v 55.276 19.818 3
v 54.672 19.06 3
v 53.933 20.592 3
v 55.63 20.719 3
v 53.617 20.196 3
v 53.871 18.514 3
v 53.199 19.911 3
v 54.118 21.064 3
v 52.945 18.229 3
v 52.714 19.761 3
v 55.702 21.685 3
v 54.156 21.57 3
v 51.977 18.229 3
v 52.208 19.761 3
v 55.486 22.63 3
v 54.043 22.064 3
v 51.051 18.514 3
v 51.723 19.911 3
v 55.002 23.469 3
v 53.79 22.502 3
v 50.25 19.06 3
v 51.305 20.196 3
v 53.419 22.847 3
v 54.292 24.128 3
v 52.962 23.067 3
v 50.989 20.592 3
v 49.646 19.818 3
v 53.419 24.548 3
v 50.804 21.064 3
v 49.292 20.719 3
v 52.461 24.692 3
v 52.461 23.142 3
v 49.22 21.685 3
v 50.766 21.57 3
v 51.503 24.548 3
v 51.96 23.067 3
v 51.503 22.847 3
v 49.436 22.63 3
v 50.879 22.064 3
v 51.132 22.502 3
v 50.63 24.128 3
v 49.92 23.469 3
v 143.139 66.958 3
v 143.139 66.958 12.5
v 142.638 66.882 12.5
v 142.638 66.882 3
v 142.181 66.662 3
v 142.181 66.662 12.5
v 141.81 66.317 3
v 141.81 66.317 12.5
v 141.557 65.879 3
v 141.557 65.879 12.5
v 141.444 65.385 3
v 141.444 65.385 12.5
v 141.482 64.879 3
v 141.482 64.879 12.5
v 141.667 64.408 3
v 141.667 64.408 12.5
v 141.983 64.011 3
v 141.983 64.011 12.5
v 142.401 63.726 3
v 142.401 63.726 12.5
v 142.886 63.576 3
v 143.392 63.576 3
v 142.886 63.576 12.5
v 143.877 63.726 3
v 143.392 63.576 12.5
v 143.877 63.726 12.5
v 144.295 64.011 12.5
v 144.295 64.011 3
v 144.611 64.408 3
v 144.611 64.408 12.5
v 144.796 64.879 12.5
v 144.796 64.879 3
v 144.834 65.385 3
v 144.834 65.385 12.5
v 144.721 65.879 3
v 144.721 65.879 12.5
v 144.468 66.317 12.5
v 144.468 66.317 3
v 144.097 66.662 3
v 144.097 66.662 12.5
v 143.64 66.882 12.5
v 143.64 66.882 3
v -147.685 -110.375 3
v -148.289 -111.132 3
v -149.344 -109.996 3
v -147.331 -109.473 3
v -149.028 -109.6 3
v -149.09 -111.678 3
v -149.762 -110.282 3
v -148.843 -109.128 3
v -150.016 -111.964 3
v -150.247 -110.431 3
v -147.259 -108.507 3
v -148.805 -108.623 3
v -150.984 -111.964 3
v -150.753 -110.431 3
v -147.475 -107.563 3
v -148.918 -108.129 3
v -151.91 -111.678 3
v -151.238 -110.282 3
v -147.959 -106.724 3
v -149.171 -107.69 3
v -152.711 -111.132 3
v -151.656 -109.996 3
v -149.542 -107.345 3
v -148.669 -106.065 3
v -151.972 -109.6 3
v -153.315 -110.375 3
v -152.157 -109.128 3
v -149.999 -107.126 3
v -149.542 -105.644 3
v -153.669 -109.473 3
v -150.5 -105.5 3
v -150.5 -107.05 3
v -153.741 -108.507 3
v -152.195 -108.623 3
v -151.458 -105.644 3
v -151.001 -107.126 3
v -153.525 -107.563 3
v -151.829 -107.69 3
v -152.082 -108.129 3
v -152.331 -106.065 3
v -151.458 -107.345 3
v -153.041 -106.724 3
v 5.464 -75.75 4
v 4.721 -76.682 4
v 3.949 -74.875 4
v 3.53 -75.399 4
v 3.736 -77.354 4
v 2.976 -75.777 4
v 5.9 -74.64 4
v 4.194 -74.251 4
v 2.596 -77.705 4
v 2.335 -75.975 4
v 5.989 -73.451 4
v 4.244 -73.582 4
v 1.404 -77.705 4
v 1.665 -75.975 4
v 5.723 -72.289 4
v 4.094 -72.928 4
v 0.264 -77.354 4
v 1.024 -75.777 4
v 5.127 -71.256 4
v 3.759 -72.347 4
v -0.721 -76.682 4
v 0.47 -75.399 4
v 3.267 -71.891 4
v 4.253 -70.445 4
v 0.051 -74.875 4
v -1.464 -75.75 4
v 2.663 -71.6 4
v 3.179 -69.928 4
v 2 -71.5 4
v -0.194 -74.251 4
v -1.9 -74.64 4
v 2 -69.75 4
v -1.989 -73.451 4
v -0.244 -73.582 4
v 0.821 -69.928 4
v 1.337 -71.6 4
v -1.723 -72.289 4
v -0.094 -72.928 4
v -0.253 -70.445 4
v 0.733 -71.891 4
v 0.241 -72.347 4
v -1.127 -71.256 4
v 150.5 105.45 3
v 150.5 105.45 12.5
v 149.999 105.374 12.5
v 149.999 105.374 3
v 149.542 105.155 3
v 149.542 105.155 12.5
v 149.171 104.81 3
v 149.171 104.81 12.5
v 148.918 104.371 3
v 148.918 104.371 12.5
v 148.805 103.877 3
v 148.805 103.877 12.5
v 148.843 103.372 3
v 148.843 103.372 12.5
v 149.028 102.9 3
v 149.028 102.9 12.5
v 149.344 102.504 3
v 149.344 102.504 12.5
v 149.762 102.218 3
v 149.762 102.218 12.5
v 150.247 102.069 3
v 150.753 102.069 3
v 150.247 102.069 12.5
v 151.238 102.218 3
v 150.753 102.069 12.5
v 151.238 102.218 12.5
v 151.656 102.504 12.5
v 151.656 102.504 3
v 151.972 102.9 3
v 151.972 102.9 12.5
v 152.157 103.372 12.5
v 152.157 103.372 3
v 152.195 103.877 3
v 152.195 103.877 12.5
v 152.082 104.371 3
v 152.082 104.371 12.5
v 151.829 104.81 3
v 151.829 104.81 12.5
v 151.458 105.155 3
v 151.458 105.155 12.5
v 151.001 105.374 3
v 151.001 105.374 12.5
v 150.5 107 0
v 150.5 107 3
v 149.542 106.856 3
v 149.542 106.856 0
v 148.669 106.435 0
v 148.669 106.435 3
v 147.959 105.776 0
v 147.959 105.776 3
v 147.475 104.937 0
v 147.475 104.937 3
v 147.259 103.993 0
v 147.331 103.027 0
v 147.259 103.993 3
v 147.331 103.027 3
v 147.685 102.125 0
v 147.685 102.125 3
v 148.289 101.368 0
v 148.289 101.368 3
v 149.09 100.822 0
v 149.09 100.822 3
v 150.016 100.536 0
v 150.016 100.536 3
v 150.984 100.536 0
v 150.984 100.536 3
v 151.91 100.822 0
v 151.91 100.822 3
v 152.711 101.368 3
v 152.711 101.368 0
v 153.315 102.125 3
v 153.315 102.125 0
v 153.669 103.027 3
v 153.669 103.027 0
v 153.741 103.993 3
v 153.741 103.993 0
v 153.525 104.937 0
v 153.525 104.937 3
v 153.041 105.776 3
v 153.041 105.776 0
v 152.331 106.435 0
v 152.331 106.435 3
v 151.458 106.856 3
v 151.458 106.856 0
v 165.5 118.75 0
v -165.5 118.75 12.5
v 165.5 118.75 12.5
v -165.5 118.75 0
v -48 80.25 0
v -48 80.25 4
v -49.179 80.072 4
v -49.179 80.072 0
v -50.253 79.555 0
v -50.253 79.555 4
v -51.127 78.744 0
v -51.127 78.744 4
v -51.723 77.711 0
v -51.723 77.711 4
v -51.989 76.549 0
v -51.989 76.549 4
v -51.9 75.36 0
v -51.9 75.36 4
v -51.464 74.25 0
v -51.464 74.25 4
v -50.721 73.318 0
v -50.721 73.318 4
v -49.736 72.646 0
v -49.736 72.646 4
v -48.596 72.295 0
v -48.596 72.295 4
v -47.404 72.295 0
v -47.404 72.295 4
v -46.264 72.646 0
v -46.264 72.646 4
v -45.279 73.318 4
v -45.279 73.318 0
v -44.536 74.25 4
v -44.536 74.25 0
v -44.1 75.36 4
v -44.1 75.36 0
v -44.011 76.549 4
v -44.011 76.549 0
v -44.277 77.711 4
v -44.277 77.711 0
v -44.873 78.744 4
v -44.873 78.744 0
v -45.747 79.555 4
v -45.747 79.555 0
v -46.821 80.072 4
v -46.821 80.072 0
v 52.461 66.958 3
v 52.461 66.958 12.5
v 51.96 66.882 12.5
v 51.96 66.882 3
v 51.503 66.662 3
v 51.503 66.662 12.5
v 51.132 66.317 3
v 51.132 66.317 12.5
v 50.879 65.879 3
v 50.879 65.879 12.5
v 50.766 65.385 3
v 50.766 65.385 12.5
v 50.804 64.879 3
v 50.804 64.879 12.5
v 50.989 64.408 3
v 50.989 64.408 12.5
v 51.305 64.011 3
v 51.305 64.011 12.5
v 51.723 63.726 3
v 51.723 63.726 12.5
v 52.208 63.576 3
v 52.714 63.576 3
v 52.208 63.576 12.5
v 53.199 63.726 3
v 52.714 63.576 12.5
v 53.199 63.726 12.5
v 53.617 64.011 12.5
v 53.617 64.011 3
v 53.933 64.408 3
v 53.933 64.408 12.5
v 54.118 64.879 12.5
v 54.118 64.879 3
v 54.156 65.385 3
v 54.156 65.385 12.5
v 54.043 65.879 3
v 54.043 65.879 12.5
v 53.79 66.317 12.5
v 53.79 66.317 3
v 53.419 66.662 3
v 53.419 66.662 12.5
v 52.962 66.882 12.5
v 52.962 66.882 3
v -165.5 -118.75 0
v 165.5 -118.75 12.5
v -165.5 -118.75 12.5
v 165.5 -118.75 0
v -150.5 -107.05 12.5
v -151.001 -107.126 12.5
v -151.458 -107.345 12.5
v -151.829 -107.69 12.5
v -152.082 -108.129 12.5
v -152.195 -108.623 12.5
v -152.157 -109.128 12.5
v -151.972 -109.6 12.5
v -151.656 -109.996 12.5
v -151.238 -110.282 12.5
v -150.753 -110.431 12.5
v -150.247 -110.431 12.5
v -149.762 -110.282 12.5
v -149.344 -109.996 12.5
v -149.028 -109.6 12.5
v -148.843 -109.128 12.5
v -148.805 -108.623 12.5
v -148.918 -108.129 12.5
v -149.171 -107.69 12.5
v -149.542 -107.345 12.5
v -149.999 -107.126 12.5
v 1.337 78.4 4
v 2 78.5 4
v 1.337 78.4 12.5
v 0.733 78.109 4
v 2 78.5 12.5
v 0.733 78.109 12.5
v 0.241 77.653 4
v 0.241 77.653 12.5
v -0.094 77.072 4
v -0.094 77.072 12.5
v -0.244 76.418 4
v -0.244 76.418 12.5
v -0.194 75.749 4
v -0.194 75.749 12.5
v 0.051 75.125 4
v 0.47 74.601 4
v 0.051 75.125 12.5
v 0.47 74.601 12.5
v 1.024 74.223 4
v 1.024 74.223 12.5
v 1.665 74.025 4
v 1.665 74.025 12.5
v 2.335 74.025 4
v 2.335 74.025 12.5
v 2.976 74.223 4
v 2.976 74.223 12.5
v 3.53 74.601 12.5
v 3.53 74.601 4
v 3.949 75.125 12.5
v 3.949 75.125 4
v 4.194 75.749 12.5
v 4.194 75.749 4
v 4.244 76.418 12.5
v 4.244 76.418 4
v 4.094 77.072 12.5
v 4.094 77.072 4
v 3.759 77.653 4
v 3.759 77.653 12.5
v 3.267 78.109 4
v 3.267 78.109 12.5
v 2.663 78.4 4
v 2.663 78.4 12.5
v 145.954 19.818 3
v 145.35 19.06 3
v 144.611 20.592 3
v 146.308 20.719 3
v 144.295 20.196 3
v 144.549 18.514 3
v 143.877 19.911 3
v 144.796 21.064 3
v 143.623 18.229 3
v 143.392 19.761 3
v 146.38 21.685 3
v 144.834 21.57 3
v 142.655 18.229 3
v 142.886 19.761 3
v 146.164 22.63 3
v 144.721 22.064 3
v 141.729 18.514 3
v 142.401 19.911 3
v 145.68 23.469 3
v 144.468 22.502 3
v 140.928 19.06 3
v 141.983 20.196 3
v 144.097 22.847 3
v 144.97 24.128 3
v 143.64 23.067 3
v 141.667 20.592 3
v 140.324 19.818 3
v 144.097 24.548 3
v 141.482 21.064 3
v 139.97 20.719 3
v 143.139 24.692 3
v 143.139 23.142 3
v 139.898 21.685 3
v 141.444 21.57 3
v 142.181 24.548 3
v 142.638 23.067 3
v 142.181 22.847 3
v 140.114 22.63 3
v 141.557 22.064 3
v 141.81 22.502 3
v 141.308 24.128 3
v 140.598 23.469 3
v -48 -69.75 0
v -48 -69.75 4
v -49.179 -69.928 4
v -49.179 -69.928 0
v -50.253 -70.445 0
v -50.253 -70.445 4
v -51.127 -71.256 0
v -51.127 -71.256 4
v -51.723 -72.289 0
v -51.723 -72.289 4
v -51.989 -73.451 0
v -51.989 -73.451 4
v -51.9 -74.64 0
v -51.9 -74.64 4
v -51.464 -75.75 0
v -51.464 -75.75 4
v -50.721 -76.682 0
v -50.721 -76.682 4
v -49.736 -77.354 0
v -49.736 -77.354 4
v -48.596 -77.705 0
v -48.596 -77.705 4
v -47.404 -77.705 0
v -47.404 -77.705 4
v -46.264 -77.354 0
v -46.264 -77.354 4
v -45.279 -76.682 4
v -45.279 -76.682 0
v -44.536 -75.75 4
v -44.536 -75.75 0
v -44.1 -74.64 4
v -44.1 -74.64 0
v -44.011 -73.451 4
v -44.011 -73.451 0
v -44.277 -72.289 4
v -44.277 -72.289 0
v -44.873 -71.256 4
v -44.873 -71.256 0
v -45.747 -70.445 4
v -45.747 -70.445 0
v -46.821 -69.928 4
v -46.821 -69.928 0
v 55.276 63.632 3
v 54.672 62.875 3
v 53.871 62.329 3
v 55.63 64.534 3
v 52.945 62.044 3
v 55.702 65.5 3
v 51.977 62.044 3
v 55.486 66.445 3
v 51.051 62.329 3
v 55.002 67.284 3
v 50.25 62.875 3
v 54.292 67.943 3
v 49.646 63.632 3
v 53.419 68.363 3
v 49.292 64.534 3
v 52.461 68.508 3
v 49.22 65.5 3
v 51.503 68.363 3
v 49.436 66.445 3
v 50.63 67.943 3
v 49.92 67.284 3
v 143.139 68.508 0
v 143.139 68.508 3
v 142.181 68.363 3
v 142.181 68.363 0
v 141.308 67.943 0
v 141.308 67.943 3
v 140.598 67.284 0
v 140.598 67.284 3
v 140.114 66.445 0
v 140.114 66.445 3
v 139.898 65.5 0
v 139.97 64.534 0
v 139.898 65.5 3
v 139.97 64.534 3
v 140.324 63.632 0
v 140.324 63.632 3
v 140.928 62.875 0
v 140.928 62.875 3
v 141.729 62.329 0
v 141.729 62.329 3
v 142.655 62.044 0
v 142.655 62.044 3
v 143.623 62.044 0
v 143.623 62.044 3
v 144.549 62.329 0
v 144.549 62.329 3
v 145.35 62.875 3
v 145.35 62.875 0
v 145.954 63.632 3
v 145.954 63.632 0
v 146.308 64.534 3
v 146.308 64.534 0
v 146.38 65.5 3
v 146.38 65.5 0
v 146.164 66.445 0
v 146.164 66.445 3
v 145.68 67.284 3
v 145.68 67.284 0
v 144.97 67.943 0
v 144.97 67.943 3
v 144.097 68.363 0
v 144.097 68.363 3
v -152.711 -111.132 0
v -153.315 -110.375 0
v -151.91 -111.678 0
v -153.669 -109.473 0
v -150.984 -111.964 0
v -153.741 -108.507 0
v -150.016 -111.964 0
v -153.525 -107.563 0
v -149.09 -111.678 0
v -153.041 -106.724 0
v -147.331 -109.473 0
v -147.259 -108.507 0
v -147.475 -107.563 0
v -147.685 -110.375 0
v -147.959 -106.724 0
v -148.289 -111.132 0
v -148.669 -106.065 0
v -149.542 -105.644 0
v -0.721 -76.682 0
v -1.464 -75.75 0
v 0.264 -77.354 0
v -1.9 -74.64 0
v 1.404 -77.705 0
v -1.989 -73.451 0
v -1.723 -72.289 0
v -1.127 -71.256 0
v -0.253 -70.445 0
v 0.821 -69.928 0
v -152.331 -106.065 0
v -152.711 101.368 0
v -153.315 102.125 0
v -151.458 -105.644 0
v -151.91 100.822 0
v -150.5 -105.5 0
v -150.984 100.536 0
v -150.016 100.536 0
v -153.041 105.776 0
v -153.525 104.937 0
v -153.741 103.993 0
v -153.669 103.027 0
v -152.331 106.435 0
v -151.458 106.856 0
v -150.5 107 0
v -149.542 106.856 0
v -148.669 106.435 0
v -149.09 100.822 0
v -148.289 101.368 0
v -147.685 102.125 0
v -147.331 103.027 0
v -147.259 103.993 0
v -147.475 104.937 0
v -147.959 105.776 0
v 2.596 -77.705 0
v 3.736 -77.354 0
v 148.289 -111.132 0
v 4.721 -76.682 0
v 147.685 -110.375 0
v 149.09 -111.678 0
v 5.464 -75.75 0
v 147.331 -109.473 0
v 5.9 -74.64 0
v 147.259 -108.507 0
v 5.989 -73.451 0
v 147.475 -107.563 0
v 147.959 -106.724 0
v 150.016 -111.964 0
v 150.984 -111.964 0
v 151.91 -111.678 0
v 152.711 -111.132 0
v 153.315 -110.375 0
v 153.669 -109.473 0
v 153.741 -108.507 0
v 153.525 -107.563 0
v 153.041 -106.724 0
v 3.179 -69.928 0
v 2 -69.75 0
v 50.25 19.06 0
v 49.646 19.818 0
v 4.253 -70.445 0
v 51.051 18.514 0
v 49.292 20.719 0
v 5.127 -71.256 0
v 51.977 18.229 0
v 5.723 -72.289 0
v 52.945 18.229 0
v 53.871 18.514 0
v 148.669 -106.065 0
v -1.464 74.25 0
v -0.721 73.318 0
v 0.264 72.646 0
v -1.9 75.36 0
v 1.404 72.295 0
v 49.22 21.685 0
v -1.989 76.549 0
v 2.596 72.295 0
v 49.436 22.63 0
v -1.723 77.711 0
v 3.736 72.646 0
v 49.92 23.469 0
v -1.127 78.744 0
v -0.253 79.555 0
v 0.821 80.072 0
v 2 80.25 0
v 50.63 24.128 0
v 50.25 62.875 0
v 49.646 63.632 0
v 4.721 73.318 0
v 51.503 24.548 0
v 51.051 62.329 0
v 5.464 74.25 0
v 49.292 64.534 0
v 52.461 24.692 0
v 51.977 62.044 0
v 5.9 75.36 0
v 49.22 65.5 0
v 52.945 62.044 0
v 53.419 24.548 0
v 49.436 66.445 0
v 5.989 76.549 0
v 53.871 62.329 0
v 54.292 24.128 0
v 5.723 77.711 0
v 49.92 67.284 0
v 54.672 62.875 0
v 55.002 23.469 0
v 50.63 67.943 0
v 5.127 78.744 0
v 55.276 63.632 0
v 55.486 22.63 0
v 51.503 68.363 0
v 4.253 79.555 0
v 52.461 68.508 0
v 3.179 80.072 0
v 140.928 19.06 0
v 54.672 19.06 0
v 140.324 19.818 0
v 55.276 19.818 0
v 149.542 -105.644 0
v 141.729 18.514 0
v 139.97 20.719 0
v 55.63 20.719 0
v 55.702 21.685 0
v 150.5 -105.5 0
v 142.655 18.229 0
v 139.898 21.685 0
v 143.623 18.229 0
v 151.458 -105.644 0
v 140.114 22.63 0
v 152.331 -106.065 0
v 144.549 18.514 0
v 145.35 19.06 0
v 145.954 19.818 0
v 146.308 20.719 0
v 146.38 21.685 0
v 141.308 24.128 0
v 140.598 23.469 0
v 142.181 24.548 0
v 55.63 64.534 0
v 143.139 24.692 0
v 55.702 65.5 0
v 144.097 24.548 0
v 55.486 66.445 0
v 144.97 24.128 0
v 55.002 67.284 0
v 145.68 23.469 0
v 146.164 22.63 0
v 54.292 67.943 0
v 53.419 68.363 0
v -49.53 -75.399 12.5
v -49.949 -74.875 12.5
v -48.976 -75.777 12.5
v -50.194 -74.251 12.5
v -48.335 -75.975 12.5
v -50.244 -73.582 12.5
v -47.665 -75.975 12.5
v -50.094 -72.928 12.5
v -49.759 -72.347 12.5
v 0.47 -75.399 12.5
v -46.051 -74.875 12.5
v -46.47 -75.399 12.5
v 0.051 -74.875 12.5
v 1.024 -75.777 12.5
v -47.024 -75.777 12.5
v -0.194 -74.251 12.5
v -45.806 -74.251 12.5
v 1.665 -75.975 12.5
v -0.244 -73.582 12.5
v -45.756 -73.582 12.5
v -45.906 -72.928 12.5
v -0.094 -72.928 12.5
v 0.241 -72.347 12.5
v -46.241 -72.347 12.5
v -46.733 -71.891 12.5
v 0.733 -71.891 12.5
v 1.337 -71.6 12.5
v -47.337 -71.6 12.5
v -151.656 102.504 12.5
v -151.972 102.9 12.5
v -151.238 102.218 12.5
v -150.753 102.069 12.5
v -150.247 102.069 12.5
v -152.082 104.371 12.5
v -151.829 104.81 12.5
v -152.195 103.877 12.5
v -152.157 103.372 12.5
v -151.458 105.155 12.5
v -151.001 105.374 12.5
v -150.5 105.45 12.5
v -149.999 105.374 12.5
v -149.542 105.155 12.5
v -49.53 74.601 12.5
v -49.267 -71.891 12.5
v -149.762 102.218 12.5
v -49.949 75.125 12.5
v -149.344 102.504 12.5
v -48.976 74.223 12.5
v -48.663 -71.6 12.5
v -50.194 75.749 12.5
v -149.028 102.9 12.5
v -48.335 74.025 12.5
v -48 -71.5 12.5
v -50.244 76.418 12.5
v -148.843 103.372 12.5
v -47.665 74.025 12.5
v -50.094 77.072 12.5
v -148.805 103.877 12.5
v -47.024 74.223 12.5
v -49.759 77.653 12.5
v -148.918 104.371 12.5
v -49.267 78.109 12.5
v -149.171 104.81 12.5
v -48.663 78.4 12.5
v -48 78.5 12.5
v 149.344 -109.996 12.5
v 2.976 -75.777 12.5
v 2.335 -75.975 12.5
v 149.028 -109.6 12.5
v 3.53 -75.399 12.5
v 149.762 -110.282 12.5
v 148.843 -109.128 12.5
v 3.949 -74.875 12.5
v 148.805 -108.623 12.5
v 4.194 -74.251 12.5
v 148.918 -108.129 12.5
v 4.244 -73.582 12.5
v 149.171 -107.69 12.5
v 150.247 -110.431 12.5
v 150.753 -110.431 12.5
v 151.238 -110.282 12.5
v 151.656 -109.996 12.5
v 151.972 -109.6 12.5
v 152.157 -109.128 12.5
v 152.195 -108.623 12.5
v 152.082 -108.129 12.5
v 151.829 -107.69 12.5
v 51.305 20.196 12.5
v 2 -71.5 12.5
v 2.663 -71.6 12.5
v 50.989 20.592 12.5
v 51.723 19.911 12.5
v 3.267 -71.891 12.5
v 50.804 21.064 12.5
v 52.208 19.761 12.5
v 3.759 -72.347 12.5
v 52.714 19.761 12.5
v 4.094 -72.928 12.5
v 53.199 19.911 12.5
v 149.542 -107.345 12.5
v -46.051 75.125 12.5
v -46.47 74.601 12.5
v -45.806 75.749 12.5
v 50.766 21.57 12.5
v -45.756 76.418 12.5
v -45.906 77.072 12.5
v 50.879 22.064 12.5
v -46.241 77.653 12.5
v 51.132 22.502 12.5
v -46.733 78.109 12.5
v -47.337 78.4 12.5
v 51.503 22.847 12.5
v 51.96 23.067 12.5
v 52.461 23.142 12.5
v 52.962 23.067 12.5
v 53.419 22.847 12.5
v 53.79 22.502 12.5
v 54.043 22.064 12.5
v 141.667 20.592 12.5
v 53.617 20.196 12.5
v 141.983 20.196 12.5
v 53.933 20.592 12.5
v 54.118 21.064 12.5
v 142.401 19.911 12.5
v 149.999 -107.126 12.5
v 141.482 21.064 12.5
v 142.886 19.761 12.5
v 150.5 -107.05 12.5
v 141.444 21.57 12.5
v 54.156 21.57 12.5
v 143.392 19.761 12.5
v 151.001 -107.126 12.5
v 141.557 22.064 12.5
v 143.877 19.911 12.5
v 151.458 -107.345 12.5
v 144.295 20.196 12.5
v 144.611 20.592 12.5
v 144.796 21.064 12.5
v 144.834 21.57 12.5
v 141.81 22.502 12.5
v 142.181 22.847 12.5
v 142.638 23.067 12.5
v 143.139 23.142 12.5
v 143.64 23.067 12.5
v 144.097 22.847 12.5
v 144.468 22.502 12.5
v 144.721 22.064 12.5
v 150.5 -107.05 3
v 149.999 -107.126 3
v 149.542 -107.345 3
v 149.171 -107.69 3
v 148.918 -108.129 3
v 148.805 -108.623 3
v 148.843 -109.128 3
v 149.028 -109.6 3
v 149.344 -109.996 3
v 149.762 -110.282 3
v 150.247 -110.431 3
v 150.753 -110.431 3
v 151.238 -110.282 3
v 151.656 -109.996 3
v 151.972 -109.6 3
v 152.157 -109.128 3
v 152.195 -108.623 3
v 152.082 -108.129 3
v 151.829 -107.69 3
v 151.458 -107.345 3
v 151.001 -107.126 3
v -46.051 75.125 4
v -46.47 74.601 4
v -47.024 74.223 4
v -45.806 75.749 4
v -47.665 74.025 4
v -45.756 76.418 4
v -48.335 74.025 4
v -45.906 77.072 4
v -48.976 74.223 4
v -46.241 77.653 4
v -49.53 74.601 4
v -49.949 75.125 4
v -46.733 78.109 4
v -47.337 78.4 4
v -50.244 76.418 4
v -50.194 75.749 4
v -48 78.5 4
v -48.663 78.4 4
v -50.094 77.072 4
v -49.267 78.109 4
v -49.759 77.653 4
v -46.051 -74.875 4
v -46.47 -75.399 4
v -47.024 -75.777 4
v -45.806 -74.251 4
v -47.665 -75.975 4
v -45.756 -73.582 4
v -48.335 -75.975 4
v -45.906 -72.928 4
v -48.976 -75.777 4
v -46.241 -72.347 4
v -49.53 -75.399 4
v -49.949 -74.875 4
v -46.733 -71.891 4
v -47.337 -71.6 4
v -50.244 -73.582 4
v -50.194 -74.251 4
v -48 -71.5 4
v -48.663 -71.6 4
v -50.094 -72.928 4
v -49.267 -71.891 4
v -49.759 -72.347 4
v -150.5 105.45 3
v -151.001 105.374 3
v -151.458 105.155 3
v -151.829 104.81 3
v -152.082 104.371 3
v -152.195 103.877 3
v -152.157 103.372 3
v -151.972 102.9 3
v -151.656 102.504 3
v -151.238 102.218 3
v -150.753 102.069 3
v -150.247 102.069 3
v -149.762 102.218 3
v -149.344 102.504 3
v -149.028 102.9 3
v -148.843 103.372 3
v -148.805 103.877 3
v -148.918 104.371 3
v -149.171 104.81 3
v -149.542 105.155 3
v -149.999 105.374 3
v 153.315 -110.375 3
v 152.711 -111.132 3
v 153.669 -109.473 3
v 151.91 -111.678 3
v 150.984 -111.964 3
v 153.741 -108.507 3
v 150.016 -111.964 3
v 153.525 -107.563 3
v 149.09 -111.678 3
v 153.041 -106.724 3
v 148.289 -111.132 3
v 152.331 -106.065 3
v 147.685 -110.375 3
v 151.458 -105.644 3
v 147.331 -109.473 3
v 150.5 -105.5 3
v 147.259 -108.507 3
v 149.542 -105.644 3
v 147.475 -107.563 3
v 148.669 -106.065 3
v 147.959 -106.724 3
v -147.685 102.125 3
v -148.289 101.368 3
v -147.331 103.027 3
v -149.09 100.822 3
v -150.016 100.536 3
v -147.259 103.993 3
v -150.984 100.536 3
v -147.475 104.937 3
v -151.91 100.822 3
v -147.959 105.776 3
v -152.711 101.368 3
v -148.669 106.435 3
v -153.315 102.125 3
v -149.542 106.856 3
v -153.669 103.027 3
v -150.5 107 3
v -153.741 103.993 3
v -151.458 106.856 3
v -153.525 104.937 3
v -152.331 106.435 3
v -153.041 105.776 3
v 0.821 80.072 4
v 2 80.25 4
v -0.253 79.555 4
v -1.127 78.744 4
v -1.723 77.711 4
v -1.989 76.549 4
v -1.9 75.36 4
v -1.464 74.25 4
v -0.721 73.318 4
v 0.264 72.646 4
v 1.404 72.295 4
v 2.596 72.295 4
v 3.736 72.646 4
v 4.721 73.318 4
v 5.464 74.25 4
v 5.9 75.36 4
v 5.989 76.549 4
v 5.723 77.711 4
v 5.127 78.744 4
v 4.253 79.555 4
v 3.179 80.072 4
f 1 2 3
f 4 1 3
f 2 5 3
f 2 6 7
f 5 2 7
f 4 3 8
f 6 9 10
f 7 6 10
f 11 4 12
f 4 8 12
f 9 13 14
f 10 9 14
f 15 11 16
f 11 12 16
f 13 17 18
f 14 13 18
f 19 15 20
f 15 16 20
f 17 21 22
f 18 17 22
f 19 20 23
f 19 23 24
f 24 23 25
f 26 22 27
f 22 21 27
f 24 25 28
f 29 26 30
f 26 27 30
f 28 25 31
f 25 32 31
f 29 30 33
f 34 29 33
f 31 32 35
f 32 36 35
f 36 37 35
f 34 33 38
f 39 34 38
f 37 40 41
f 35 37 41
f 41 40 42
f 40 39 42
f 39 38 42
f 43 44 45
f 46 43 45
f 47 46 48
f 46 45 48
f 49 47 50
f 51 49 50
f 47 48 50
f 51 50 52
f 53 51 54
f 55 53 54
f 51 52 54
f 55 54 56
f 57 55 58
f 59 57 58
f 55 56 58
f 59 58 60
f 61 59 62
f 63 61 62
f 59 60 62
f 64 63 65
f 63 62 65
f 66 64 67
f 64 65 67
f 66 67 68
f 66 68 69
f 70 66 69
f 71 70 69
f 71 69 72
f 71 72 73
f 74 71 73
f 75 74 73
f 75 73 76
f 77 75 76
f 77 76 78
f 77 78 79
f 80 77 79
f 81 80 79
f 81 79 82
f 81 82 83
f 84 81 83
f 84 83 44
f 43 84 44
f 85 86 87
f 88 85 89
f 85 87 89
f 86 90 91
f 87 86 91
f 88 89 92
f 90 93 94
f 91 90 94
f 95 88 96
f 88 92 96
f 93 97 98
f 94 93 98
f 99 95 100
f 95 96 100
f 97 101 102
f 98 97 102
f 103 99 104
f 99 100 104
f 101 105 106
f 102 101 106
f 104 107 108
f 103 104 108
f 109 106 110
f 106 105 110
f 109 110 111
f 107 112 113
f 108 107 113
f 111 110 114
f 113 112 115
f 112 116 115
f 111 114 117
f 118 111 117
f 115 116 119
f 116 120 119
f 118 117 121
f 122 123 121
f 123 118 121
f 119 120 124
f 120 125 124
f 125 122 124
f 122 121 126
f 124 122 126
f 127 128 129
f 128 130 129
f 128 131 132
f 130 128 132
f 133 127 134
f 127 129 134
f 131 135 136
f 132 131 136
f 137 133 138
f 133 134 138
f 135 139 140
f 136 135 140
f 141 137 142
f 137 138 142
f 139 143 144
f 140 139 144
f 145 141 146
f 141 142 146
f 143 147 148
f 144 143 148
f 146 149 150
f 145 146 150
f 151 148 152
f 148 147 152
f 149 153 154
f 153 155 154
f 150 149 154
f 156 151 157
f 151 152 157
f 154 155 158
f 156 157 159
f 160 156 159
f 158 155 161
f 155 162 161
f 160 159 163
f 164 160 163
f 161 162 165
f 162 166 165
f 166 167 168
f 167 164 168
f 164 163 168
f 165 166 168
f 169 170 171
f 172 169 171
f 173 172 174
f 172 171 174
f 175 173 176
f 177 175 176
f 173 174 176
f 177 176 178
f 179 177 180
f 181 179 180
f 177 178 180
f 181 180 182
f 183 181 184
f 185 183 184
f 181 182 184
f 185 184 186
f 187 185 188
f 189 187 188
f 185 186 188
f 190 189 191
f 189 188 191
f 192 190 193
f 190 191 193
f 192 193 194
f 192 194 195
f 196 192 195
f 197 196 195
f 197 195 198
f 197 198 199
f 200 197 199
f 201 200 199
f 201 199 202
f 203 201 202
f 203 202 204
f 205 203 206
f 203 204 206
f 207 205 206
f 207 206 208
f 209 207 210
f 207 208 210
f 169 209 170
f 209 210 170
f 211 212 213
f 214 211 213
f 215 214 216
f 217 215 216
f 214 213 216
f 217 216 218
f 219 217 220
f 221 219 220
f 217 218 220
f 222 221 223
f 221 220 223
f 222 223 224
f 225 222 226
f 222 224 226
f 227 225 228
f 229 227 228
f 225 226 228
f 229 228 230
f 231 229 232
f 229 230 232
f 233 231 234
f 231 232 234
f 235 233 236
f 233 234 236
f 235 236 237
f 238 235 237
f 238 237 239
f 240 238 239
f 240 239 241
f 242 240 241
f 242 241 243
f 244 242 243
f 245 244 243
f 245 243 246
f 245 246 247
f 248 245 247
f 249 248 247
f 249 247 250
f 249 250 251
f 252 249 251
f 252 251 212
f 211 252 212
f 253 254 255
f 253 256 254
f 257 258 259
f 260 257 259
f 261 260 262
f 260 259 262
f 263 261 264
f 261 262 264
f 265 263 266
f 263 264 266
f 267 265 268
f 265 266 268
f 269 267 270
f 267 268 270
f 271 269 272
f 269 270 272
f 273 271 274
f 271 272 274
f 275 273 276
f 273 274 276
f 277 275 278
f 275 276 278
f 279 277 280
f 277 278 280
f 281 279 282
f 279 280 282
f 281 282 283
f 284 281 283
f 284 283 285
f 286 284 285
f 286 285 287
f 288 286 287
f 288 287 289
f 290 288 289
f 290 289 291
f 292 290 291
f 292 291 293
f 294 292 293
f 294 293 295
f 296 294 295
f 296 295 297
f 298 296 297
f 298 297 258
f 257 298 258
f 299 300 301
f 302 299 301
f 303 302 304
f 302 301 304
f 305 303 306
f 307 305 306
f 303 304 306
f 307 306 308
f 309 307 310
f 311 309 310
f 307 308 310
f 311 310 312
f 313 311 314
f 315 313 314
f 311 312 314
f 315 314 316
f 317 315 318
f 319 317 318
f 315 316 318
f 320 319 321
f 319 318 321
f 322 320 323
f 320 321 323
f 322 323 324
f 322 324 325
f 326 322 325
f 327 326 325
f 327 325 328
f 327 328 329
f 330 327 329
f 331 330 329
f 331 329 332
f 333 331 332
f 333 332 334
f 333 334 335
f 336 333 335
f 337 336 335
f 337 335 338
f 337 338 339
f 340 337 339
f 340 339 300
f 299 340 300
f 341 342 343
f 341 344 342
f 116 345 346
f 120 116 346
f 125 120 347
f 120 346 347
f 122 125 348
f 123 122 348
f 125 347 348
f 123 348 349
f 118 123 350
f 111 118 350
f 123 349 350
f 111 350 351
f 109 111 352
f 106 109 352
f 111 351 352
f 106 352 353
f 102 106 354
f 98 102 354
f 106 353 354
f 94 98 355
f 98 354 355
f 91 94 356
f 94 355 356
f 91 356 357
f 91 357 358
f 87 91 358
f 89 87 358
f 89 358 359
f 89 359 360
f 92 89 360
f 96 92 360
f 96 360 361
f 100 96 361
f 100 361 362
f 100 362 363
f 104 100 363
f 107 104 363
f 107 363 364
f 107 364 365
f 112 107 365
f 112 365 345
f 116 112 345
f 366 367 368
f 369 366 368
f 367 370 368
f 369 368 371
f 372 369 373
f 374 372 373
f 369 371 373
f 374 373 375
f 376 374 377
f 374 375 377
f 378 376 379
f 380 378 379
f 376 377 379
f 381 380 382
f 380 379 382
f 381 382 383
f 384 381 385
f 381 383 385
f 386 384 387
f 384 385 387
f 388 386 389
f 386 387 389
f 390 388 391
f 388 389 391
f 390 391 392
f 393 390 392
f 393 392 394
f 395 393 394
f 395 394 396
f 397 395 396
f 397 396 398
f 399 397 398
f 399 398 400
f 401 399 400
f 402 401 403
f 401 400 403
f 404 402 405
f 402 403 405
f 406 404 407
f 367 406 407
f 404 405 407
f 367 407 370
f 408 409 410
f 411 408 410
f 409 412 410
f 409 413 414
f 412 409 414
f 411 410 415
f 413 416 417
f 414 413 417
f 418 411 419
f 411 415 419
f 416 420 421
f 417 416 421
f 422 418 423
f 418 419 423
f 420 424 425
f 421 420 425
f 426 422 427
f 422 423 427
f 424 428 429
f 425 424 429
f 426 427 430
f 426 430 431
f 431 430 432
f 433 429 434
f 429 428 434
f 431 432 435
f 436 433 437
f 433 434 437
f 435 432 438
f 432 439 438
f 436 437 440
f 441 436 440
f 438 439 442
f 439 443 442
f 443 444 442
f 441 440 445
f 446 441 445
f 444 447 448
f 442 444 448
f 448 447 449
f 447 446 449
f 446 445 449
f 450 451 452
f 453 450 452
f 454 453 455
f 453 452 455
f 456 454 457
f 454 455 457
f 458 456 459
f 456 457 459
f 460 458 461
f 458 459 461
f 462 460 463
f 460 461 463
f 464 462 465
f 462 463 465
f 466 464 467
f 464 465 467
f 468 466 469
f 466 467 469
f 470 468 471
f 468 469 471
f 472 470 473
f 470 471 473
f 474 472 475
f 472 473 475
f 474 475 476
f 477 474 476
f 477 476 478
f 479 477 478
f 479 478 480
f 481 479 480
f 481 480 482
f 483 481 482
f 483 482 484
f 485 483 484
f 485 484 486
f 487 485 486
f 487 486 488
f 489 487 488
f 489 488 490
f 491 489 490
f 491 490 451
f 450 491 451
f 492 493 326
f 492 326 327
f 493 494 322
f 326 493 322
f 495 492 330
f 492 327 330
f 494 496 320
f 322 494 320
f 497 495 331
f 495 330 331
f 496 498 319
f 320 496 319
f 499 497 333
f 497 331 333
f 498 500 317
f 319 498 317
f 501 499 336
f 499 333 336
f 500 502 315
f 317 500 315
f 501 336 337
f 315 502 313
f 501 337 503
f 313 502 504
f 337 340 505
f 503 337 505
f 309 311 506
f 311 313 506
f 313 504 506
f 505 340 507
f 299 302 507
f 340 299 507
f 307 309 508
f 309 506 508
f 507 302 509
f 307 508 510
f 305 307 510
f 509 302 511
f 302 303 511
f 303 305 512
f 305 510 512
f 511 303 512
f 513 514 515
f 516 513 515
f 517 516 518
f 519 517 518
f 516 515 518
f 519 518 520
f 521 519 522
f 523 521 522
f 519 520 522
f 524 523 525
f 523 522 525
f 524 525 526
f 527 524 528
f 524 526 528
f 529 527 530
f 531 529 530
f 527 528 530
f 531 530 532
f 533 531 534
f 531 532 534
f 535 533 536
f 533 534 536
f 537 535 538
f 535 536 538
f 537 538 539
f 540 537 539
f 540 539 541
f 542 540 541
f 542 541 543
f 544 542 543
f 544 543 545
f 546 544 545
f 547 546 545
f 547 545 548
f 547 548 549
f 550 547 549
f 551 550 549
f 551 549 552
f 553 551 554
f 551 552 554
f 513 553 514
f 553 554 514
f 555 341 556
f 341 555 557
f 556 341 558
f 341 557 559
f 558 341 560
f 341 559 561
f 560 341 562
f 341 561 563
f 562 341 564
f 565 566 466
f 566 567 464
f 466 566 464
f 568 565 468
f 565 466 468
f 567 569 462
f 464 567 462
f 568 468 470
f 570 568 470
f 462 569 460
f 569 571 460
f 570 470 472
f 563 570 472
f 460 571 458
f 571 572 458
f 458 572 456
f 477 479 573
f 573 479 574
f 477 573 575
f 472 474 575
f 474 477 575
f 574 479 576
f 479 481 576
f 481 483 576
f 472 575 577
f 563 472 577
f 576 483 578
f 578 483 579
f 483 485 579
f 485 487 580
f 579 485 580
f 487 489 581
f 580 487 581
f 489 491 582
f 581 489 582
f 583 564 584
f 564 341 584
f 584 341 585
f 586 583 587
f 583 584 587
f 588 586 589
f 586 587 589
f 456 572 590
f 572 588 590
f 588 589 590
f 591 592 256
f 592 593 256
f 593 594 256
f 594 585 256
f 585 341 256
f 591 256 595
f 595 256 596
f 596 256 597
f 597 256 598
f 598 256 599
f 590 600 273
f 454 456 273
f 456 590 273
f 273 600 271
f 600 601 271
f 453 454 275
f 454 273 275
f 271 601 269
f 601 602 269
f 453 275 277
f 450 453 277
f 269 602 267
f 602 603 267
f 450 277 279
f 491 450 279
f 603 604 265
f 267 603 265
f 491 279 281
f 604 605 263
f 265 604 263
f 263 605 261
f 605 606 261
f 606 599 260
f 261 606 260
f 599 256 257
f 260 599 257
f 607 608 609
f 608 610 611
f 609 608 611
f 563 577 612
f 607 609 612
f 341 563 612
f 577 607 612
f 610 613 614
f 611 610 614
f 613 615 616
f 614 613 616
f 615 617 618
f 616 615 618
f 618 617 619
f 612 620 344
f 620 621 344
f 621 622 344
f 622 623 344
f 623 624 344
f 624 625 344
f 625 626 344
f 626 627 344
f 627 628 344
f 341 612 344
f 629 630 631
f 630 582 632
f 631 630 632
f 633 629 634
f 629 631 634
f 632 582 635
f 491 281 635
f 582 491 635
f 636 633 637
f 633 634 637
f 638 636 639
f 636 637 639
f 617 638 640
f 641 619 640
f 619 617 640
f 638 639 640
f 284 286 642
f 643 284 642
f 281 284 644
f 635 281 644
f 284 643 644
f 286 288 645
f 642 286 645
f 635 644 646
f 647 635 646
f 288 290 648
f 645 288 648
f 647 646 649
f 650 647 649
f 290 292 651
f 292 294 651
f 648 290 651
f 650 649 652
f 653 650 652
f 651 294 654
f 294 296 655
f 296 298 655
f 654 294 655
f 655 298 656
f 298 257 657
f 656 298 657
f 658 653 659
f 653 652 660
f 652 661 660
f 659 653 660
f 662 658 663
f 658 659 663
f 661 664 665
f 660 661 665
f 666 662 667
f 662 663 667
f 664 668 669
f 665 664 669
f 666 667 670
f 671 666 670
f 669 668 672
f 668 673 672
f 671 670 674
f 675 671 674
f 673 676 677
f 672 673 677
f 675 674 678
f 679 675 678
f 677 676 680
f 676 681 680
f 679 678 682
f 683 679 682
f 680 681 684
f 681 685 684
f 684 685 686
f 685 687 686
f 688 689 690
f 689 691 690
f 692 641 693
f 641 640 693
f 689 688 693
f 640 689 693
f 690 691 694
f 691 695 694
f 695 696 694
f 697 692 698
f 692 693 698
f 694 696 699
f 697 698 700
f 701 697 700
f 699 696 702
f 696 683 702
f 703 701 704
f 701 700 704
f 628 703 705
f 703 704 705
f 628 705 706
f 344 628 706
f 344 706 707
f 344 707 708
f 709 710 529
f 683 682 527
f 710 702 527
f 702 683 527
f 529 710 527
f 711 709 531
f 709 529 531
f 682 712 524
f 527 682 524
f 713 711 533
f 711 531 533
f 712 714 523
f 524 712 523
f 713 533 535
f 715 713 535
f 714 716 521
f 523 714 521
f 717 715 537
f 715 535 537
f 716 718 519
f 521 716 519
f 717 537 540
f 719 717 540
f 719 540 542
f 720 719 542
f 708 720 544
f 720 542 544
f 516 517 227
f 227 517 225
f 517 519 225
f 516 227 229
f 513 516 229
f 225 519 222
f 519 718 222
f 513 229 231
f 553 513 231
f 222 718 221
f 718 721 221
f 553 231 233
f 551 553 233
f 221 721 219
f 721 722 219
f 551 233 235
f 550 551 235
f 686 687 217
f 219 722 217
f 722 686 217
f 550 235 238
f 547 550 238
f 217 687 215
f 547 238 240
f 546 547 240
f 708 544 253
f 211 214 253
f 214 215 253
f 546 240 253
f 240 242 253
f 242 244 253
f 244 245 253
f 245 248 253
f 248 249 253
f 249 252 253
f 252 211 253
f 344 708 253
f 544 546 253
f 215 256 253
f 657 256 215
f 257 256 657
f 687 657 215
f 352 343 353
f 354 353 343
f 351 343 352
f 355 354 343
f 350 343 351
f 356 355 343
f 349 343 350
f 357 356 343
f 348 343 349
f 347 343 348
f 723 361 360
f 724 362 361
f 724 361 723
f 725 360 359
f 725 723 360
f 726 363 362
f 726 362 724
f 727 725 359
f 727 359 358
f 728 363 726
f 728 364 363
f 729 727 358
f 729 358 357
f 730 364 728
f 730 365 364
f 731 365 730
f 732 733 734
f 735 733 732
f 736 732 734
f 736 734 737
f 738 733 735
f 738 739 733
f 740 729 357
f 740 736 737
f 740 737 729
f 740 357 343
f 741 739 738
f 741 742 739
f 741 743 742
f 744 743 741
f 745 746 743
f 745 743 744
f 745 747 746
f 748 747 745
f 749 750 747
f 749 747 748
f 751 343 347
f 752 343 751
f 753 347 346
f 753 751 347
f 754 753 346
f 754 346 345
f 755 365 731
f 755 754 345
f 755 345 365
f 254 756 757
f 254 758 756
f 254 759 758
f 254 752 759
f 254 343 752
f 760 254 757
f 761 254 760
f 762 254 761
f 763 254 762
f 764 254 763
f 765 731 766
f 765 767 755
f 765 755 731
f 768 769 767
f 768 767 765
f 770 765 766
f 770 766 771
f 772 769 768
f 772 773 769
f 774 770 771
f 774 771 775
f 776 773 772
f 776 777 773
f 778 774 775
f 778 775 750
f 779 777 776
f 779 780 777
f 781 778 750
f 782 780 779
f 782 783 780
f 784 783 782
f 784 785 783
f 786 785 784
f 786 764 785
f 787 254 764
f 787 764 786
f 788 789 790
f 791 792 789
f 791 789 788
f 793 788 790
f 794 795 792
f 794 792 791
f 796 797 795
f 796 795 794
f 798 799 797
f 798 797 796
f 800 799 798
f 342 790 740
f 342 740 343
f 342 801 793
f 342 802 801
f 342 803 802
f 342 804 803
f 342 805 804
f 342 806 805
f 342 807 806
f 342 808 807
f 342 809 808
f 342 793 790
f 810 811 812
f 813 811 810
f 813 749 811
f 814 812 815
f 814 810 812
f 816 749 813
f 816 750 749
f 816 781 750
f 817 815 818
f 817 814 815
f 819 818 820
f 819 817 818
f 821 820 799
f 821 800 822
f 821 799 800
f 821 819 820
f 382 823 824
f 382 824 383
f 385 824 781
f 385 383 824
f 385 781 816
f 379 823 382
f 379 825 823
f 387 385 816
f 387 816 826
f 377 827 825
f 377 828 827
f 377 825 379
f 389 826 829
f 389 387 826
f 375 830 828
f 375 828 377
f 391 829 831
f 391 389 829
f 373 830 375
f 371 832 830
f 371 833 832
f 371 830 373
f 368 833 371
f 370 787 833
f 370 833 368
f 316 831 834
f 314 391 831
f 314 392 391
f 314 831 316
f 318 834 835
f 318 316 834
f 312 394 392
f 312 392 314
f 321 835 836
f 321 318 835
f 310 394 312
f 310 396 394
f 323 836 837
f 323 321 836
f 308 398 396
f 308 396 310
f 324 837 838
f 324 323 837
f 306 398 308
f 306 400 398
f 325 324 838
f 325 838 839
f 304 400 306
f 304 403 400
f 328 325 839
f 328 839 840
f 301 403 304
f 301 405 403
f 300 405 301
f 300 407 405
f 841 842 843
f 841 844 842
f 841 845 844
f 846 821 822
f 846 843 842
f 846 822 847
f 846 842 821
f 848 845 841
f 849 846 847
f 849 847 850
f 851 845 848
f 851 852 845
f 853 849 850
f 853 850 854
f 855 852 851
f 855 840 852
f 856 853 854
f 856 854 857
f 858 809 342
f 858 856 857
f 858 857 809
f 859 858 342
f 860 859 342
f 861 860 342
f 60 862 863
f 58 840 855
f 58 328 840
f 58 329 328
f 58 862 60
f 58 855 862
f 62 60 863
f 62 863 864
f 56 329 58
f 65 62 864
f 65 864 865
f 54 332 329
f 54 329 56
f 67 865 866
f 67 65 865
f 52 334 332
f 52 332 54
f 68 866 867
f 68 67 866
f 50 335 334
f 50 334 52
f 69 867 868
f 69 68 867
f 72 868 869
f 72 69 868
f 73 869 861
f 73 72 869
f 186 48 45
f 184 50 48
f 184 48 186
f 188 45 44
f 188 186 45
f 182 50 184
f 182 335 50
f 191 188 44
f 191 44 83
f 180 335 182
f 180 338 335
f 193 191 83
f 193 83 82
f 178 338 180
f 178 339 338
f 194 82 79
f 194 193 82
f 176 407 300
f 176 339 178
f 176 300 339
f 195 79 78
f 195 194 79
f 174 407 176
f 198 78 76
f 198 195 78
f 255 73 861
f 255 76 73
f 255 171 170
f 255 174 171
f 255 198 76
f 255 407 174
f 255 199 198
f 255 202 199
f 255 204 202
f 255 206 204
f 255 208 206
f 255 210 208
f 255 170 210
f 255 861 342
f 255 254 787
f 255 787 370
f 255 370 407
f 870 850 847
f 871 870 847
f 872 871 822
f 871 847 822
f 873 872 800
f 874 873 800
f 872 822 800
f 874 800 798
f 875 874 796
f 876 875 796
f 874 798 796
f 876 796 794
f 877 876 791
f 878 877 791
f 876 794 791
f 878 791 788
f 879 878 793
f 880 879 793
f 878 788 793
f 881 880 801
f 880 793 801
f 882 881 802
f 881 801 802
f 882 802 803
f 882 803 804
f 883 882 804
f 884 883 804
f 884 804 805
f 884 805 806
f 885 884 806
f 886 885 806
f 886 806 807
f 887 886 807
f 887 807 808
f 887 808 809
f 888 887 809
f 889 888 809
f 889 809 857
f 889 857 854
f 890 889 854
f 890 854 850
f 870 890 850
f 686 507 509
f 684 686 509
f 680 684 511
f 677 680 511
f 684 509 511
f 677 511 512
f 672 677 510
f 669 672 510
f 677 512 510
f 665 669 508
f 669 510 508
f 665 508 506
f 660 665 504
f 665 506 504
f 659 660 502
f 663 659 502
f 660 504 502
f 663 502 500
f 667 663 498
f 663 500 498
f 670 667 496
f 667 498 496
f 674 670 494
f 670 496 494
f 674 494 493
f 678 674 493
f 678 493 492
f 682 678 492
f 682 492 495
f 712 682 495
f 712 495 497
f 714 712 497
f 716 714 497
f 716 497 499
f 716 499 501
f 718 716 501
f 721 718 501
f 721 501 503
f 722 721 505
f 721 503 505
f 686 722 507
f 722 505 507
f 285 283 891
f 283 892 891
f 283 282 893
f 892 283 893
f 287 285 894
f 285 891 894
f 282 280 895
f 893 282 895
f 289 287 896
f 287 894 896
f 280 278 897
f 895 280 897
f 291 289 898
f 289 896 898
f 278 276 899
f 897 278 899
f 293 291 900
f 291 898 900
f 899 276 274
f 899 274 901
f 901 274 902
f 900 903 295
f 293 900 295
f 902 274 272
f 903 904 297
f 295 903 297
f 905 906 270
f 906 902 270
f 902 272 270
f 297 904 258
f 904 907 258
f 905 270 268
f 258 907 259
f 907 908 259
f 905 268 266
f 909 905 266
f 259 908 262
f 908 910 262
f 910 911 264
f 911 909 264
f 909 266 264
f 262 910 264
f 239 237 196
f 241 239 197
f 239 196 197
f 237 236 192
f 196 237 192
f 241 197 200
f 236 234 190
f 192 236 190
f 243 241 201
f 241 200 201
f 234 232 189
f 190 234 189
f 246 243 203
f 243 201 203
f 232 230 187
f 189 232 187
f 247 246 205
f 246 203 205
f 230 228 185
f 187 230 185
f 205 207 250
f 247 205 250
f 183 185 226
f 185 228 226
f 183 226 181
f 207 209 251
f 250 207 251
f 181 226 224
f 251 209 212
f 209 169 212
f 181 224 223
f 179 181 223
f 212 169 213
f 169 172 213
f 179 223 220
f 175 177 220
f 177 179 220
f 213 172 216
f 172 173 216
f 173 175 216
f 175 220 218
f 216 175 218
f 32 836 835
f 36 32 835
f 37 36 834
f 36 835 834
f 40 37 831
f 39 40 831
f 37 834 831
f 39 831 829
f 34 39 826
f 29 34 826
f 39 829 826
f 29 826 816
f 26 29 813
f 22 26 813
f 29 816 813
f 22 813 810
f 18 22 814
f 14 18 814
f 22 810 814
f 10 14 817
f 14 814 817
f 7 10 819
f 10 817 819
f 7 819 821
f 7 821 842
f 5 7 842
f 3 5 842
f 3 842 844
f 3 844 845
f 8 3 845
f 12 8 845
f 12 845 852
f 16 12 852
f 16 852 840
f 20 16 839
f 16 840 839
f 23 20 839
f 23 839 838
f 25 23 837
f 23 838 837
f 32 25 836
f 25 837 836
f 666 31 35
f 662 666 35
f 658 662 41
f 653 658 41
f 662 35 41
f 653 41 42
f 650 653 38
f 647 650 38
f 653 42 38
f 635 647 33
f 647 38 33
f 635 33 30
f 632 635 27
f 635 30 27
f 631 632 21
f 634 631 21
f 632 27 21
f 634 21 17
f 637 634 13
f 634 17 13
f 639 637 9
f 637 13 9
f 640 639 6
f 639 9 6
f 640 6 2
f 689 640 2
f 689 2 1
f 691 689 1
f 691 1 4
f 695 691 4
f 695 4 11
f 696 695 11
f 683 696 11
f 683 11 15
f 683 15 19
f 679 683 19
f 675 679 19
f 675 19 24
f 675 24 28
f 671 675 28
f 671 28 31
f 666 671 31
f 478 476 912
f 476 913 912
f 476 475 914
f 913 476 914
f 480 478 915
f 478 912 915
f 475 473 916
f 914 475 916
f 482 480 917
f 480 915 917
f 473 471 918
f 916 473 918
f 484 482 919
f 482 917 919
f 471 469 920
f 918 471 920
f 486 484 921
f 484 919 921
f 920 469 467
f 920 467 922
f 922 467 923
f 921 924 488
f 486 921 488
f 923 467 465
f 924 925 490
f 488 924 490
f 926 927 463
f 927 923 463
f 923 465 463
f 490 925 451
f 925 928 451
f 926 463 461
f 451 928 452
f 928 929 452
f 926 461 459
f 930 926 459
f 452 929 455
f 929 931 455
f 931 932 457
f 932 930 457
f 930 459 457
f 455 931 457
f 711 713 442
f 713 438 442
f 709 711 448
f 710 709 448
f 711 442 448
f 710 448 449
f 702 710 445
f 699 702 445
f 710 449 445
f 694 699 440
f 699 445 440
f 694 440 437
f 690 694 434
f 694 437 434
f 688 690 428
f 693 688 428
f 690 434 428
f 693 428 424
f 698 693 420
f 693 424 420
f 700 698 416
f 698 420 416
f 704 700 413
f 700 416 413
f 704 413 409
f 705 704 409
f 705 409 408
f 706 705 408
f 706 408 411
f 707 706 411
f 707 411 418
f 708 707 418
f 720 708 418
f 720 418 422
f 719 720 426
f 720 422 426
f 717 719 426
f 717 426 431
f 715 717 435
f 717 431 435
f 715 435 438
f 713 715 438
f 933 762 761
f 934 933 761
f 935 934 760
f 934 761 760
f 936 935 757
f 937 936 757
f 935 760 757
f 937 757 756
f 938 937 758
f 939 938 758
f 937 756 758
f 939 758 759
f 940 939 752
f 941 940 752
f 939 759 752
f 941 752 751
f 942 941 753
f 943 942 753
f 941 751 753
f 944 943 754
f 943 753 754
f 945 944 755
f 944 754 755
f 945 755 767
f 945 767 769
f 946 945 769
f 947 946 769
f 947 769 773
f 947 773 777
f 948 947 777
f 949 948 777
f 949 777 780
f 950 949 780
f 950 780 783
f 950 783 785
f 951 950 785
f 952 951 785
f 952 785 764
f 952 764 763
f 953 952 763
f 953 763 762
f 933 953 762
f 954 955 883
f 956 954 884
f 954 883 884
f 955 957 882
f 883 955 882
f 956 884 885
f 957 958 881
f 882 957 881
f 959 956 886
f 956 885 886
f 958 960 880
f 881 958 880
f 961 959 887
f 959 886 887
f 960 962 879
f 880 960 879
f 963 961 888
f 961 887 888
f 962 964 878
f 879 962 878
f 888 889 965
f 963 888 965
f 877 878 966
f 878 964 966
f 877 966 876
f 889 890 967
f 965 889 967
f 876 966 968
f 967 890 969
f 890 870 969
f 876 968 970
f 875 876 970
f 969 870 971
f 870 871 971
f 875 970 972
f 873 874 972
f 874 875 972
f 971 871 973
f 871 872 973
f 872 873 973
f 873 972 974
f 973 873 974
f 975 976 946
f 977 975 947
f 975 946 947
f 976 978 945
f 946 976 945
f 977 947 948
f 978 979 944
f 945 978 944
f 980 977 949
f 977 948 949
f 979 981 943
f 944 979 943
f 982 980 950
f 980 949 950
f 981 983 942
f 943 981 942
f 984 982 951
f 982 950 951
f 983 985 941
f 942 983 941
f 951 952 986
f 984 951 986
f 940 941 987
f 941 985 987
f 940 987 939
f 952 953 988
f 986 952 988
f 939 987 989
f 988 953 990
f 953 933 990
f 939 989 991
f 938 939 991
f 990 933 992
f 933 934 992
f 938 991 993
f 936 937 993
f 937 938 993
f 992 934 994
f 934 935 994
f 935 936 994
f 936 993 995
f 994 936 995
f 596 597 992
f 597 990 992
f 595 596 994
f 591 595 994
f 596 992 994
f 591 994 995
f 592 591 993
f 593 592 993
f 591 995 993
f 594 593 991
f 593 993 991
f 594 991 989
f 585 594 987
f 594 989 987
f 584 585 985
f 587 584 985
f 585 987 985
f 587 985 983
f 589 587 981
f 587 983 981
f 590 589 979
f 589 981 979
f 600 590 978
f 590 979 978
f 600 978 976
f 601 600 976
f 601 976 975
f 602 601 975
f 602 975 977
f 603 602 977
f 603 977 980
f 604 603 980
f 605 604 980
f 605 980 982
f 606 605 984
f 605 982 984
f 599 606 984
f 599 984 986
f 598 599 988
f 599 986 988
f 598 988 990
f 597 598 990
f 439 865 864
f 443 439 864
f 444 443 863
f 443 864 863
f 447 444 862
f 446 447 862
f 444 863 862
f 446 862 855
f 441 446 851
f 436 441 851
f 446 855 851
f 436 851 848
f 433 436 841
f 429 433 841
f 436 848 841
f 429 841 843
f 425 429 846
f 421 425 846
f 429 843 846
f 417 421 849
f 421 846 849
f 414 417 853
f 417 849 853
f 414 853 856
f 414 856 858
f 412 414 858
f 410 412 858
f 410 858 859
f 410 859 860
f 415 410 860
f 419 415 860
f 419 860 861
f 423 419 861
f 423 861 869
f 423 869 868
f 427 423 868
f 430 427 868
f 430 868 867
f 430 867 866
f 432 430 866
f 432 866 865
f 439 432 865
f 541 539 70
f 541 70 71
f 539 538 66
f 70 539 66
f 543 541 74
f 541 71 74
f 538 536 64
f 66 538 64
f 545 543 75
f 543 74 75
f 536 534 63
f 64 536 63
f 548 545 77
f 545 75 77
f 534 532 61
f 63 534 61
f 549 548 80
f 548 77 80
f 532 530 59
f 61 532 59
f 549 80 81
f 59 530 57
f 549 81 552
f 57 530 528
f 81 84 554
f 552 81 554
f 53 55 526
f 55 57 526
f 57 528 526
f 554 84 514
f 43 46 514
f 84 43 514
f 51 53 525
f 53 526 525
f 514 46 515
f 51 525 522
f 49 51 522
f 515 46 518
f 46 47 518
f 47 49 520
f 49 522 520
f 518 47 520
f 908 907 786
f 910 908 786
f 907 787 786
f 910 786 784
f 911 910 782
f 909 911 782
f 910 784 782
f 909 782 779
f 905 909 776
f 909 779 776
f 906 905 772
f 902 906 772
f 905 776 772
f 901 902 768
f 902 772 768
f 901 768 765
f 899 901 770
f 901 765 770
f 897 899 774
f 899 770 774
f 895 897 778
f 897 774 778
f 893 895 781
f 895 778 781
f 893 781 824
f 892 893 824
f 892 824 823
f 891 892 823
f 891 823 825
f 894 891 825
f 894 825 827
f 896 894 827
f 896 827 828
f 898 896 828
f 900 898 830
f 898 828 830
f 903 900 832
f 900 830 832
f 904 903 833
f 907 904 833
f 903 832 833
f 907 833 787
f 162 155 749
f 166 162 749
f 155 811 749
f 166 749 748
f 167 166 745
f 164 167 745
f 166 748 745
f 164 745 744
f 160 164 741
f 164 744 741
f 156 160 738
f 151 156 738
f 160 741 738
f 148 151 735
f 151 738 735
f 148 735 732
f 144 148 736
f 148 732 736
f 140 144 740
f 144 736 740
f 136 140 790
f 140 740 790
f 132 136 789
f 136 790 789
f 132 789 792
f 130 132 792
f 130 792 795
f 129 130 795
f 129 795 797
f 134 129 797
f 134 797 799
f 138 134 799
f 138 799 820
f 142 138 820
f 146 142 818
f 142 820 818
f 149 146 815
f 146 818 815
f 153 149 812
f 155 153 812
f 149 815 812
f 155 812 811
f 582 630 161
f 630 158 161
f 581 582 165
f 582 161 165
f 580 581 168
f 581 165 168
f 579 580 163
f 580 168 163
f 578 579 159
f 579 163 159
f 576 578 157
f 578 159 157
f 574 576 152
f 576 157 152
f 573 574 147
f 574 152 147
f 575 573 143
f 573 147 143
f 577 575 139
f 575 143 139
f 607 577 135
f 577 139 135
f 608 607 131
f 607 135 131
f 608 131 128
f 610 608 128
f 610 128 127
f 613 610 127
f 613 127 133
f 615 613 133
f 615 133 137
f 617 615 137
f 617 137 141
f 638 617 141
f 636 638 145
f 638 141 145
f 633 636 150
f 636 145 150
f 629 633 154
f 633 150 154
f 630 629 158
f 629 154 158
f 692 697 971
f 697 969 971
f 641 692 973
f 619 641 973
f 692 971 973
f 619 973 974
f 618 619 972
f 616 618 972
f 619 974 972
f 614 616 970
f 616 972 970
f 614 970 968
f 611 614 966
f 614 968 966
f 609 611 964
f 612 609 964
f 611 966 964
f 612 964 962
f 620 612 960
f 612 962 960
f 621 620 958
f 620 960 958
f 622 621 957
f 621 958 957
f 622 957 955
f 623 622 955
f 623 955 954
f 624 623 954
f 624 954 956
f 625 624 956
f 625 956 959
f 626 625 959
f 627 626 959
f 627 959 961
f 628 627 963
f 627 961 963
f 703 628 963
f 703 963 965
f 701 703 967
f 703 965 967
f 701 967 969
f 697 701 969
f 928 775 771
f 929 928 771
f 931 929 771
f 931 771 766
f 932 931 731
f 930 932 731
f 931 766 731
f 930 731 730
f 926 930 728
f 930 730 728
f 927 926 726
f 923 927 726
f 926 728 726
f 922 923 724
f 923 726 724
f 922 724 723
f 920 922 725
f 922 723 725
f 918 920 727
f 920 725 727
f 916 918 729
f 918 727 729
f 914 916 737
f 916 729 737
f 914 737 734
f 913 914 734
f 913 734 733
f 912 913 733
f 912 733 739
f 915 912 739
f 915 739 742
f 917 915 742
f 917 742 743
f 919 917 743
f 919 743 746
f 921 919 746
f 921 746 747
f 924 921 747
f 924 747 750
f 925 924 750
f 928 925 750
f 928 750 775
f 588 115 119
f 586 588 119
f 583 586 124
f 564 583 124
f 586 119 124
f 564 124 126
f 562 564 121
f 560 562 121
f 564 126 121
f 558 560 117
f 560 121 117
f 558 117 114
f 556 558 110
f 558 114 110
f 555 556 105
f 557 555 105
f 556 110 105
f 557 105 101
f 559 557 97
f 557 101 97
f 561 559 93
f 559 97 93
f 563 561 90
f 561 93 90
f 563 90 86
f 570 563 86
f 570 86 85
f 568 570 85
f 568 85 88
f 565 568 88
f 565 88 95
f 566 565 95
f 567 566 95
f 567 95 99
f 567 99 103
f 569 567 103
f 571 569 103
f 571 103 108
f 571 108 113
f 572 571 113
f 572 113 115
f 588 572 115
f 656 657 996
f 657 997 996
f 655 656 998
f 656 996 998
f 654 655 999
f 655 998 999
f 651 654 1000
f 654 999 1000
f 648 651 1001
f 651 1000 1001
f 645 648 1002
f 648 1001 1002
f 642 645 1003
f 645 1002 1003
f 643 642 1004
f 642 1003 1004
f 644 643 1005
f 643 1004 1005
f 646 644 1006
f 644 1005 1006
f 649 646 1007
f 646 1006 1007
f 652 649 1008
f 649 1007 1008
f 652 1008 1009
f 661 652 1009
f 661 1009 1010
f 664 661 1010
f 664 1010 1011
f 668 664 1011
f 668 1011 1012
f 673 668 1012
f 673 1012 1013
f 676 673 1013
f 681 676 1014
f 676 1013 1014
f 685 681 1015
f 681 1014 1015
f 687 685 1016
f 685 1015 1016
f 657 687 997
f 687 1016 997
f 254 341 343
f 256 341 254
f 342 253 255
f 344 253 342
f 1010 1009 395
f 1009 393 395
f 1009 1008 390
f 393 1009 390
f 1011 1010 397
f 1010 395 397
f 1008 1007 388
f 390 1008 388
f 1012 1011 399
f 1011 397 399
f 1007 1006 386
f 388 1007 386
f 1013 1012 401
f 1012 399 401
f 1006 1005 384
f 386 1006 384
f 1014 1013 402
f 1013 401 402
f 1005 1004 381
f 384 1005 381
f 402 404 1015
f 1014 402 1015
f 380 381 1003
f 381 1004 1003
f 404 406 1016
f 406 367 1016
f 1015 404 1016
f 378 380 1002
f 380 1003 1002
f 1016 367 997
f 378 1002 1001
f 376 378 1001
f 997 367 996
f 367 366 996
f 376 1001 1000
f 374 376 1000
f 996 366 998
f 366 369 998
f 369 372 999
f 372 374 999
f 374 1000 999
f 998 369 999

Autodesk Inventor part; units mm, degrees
ref_plane "YZ Plane" through (0, 0, 0) normal (1, 0, 0) x (0, 1, 0)
ref_plane "XZ Plane" through (0, 0, 0) normal (0, 1, 0) x (-1, 0, 0)
ref_plane "XY Plane" through (0, 0, 0) normal (0, 0, 1) x (1, 0, 0)
sketch "Sketch1" plane through (0, 0, 0) normal (0, 0, 1) x (1, 0, 0)
  line L0 (-165.5, 118.75) -> (165.5, 118.75)
  line L1 (165.5, 118.75) -> (165.5, -118.75)
  line L2 (165.5, -118.75) -> (-165.5, -118.75)
  line L3 (-165.5, -118.75) -> (-165.5, 118.75)
  point P0 (0, 0)
  point P1 (-165.5, 0)
  point P2 (0, 118.75)
  dimension "d0" = 331
  dimension "d2" = 237.5
extrude "Extrusion1" add sketch "Sketch1" along normal blind 12.5
sketch "Sketch2" plane through (0, 0, 0) normal (0, 0, -1) x (-1, 0, 0)
  circle A0 centre (-150.5, 103.75) radius 1.55 projected
  line L0 (-145.8379, -108.9576) -> (-147.4259, -106.1413) projected
  circle A1 centre (150.5, -108.75) radius 1.55 projected
  circle A2 centre (150.5, 103.75) radius 1.55 projected
  line L1 (150.5, -108.75) -> (-150.5, -108.75)
  line L2 (-150.5, -108.75) -> (-150.5, 103.75)
  line L3 (-150.5, 103.75) -> (150.5, 103.75)
  line L4 (150.5, 103.75) -> (150.5, -108.75)
  circle A3 centre (-150.5, -108.75) radius 1.55
  point P0 (0, 0)
extrude "Extrusion2" cut sketch "Sketch2" against normal through all contours L3 L2 A0 | A0 L2 L3 | L3 L4 A2 | A2 L4 L3 | A3 L1 L2 | L2 L1 A3 | L4 L1 A1 | A1 L1 L4
sketch "Sketch3" plane through (0, 0, 0) normal (0, 0, -1) x (-1, 0, 0)
  circle A0 centre (150.5, -108.75) radius 1.55
  circle A1 centre (-150.5, 103.75) radius 1.55
  circle A2 centre (-150.5, -108.75) radius 1.55
  circle A3 centre (150.5, 103.75) radius 1.55
  circle A4 centre (-150.5, 103.75) radius 3.25
  circle A5 centre (-150.5, -108.75) radius 3.25
  circle A6 centre (150.5, -108.75) radius 3.25
  circle A7 centre (150.5, 103.75) radius 3.25
  circle A8 centre (-150.5, -108.75) radius 1.55 projected
  point P0 (0, 0)
  dimension "d7" = 6.5
hole "Hole1" at (150.5, 103.75, 0) at (150.5, -108.75, 0) at (-150.5, -108.75, 0) at (-150.5, 103.75, 0) direction (0, 0, 1) diameter 3.4 end through all counterbore diameter 6.5 counterbore depth 3 clearance for "Socket Head Cap Screw" size "M3" standard "Ansi Metric M Profile"
sketch "Sketch4" plane through (0, 0, 0) normal (0, 0, -1) x (-1, 0, 0)
  circle A0 centre (-2, -73.75) radius 1.621 projected
  circle A1 centre (48, 76.25) radius 1.621 projected
  circle A2 centre (-2, 76.25) radius 1.621 projected
  circle A3 centre (48, -73.75) radius 1.621 projected
  line L0 (-34.5, 108.75) -> (-34.5, -106.25) projected
  line L1 (-34.5, -106.25) -> (80.5, -106.25) projected
  line L2 (80.5, -106.25) -> (80.5, 108.75) projected
  line L3 (80.5, 108.75) -> (-34.5, 108.75) projected
  point P0 (0, 0)
hole "Hole2" at (-48, -73.75, 0) at (2, -73.75, 0) at (-48, 76.25, 0) at (2, 76.25, 0) direction (0, 0, 1) diameter 4.5 end through all counterbore diameter 8 counterbore depth 4 clearance for "Socket Head Cap Screw" size "M4" standard "Ansi Metric M Profile"
sketch "Sketch5" plane through (0, 0, 0) normal (0, 0, -1) x (-1, 0, 0)
  circle A0 centre (-143.139, 21.4425) radius 1.7 projected
  circle A1 centre (-52.461, 65.2575) radius 1.7 projected
  circle A2 centre (-143.139, 65.2575) radius 1.7 projected
  circle A3 centre (-52.461, 21.4425) radius 1.7 projected
  line L0 (-47, 17.95) -> (-148.6, 17.95) projected
  line L1 (-47, 68.75) -> (-47, 17.95) projected
  line L2 (-148.6, 68.75) -> (-47, 68.75) projected
  line L3 (-148.6, 17.95) -> (-148.6, 68.75) projected
  point P0 (0, 0)
hole "Hole3" at (143.139, 65.2575, 0) at (143.139, 21.4425, 0) at (52.461, 65.2575, 0) at (52.461, 21.4425, 0) direction (0, 0, 1) diameter 3.4 end through all counterbore diameter 6.5 counterbore depth 3 clearance for "Socket Head Cap Screw" size "M3" standard "Ansi Metric M Profile"
properties part number "bottom"
